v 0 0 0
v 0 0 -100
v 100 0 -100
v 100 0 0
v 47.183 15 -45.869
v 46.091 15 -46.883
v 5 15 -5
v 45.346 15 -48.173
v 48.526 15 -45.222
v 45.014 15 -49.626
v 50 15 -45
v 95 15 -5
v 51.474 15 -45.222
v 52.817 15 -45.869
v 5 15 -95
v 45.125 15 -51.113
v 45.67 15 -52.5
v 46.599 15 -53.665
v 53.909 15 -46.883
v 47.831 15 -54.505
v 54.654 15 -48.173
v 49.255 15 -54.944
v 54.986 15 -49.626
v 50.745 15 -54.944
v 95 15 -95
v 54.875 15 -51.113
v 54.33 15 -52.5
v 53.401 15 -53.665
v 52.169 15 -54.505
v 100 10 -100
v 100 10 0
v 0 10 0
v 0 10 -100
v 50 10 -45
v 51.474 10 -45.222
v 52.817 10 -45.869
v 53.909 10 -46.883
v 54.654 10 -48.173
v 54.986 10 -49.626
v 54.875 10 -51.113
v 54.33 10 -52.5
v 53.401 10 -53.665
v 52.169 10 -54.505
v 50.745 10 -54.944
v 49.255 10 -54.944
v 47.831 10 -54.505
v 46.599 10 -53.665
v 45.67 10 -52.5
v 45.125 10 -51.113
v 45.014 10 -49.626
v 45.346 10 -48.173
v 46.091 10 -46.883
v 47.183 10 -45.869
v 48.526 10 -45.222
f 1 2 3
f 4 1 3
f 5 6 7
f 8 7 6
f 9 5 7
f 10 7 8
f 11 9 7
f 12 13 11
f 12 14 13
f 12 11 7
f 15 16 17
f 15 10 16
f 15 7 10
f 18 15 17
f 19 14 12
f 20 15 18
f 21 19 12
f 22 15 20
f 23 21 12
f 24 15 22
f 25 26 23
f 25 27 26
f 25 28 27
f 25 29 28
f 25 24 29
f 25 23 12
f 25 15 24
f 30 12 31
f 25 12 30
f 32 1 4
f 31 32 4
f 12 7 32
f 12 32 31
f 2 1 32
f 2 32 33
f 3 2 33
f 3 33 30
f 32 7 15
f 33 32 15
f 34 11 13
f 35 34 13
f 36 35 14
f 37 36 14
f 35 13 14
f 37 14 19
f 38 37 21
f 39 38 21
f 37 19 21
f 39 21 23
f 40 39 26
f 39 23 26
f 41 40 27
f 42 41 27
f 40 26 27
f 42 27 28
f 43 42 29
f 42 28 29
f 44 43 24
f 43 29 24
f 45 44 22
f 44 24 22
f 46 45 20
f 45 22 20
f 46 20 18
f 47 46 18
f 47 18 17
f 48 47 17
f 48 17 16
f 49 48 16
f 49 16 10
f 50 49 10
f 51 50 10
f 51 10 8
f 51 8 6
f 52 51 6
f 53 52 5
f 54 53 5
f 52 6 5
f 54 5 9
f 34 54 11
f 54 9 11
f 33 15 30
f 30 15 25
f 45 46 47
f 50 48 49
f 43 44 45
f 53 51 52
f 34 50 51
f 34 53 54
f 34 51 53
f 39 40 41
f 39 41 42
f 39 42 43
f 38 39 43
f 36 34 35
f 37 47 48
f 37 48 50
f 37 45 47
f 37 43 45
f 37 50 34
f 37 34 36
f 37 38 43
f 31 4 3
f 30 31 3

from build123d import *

# Parameters (mm, degrees)
CROQUIS1_W              = 100
CROQUIS1_H              = 100
SALIENTE_EXTRUIR1_DEPTH = 15
CHAFL_N1_SIZE           = 5
CROQUIS3_R              = 5
CORTAR_EXTRUIR1_DEPTH   = 5


with BuildPart() as part:
    # Croquis1 → Saliente-Extruir1 (new body)
    with BuildSketch(Plane(origin=(0, 0, 0), x_dir=(1, 0, 0), z_dir=(0, 1, 0))):
        with Locations((50, 50)):
            Rectangle(CROQUIS1_W, CROQUIS1_H)
    extrude(amount=SALIENTE_EXTRUIR1_DEPTH)

    # Chaflán1
    chafl_n1_edges = [part.edges().sort_by_distance(p)[0] for p in [
        (100, 15, -50),
        (50, 15, -100),
        (0, 15, -50),
        (50, 15, 0),
    ]]
    chamfer(chafl_n1_edges, length=CHAFL_N1_SIZE)

    # Croquis3 → Cortar-Extruir1 (cut)
    with BuildSketch(Plane(origin=(0, 15, 0), x_dir=(1, 0, 0), z_dir=(0, 1, 0))):
        with Locations(Location((50, 50, 0), (0, 0, 270))):
            Circle(CROQUIS3_R)
    extrude(amount=-CORTAR_EXTRUIR1_DEPTH, mode=Mode.SUBTRACT)


solid = part.part
